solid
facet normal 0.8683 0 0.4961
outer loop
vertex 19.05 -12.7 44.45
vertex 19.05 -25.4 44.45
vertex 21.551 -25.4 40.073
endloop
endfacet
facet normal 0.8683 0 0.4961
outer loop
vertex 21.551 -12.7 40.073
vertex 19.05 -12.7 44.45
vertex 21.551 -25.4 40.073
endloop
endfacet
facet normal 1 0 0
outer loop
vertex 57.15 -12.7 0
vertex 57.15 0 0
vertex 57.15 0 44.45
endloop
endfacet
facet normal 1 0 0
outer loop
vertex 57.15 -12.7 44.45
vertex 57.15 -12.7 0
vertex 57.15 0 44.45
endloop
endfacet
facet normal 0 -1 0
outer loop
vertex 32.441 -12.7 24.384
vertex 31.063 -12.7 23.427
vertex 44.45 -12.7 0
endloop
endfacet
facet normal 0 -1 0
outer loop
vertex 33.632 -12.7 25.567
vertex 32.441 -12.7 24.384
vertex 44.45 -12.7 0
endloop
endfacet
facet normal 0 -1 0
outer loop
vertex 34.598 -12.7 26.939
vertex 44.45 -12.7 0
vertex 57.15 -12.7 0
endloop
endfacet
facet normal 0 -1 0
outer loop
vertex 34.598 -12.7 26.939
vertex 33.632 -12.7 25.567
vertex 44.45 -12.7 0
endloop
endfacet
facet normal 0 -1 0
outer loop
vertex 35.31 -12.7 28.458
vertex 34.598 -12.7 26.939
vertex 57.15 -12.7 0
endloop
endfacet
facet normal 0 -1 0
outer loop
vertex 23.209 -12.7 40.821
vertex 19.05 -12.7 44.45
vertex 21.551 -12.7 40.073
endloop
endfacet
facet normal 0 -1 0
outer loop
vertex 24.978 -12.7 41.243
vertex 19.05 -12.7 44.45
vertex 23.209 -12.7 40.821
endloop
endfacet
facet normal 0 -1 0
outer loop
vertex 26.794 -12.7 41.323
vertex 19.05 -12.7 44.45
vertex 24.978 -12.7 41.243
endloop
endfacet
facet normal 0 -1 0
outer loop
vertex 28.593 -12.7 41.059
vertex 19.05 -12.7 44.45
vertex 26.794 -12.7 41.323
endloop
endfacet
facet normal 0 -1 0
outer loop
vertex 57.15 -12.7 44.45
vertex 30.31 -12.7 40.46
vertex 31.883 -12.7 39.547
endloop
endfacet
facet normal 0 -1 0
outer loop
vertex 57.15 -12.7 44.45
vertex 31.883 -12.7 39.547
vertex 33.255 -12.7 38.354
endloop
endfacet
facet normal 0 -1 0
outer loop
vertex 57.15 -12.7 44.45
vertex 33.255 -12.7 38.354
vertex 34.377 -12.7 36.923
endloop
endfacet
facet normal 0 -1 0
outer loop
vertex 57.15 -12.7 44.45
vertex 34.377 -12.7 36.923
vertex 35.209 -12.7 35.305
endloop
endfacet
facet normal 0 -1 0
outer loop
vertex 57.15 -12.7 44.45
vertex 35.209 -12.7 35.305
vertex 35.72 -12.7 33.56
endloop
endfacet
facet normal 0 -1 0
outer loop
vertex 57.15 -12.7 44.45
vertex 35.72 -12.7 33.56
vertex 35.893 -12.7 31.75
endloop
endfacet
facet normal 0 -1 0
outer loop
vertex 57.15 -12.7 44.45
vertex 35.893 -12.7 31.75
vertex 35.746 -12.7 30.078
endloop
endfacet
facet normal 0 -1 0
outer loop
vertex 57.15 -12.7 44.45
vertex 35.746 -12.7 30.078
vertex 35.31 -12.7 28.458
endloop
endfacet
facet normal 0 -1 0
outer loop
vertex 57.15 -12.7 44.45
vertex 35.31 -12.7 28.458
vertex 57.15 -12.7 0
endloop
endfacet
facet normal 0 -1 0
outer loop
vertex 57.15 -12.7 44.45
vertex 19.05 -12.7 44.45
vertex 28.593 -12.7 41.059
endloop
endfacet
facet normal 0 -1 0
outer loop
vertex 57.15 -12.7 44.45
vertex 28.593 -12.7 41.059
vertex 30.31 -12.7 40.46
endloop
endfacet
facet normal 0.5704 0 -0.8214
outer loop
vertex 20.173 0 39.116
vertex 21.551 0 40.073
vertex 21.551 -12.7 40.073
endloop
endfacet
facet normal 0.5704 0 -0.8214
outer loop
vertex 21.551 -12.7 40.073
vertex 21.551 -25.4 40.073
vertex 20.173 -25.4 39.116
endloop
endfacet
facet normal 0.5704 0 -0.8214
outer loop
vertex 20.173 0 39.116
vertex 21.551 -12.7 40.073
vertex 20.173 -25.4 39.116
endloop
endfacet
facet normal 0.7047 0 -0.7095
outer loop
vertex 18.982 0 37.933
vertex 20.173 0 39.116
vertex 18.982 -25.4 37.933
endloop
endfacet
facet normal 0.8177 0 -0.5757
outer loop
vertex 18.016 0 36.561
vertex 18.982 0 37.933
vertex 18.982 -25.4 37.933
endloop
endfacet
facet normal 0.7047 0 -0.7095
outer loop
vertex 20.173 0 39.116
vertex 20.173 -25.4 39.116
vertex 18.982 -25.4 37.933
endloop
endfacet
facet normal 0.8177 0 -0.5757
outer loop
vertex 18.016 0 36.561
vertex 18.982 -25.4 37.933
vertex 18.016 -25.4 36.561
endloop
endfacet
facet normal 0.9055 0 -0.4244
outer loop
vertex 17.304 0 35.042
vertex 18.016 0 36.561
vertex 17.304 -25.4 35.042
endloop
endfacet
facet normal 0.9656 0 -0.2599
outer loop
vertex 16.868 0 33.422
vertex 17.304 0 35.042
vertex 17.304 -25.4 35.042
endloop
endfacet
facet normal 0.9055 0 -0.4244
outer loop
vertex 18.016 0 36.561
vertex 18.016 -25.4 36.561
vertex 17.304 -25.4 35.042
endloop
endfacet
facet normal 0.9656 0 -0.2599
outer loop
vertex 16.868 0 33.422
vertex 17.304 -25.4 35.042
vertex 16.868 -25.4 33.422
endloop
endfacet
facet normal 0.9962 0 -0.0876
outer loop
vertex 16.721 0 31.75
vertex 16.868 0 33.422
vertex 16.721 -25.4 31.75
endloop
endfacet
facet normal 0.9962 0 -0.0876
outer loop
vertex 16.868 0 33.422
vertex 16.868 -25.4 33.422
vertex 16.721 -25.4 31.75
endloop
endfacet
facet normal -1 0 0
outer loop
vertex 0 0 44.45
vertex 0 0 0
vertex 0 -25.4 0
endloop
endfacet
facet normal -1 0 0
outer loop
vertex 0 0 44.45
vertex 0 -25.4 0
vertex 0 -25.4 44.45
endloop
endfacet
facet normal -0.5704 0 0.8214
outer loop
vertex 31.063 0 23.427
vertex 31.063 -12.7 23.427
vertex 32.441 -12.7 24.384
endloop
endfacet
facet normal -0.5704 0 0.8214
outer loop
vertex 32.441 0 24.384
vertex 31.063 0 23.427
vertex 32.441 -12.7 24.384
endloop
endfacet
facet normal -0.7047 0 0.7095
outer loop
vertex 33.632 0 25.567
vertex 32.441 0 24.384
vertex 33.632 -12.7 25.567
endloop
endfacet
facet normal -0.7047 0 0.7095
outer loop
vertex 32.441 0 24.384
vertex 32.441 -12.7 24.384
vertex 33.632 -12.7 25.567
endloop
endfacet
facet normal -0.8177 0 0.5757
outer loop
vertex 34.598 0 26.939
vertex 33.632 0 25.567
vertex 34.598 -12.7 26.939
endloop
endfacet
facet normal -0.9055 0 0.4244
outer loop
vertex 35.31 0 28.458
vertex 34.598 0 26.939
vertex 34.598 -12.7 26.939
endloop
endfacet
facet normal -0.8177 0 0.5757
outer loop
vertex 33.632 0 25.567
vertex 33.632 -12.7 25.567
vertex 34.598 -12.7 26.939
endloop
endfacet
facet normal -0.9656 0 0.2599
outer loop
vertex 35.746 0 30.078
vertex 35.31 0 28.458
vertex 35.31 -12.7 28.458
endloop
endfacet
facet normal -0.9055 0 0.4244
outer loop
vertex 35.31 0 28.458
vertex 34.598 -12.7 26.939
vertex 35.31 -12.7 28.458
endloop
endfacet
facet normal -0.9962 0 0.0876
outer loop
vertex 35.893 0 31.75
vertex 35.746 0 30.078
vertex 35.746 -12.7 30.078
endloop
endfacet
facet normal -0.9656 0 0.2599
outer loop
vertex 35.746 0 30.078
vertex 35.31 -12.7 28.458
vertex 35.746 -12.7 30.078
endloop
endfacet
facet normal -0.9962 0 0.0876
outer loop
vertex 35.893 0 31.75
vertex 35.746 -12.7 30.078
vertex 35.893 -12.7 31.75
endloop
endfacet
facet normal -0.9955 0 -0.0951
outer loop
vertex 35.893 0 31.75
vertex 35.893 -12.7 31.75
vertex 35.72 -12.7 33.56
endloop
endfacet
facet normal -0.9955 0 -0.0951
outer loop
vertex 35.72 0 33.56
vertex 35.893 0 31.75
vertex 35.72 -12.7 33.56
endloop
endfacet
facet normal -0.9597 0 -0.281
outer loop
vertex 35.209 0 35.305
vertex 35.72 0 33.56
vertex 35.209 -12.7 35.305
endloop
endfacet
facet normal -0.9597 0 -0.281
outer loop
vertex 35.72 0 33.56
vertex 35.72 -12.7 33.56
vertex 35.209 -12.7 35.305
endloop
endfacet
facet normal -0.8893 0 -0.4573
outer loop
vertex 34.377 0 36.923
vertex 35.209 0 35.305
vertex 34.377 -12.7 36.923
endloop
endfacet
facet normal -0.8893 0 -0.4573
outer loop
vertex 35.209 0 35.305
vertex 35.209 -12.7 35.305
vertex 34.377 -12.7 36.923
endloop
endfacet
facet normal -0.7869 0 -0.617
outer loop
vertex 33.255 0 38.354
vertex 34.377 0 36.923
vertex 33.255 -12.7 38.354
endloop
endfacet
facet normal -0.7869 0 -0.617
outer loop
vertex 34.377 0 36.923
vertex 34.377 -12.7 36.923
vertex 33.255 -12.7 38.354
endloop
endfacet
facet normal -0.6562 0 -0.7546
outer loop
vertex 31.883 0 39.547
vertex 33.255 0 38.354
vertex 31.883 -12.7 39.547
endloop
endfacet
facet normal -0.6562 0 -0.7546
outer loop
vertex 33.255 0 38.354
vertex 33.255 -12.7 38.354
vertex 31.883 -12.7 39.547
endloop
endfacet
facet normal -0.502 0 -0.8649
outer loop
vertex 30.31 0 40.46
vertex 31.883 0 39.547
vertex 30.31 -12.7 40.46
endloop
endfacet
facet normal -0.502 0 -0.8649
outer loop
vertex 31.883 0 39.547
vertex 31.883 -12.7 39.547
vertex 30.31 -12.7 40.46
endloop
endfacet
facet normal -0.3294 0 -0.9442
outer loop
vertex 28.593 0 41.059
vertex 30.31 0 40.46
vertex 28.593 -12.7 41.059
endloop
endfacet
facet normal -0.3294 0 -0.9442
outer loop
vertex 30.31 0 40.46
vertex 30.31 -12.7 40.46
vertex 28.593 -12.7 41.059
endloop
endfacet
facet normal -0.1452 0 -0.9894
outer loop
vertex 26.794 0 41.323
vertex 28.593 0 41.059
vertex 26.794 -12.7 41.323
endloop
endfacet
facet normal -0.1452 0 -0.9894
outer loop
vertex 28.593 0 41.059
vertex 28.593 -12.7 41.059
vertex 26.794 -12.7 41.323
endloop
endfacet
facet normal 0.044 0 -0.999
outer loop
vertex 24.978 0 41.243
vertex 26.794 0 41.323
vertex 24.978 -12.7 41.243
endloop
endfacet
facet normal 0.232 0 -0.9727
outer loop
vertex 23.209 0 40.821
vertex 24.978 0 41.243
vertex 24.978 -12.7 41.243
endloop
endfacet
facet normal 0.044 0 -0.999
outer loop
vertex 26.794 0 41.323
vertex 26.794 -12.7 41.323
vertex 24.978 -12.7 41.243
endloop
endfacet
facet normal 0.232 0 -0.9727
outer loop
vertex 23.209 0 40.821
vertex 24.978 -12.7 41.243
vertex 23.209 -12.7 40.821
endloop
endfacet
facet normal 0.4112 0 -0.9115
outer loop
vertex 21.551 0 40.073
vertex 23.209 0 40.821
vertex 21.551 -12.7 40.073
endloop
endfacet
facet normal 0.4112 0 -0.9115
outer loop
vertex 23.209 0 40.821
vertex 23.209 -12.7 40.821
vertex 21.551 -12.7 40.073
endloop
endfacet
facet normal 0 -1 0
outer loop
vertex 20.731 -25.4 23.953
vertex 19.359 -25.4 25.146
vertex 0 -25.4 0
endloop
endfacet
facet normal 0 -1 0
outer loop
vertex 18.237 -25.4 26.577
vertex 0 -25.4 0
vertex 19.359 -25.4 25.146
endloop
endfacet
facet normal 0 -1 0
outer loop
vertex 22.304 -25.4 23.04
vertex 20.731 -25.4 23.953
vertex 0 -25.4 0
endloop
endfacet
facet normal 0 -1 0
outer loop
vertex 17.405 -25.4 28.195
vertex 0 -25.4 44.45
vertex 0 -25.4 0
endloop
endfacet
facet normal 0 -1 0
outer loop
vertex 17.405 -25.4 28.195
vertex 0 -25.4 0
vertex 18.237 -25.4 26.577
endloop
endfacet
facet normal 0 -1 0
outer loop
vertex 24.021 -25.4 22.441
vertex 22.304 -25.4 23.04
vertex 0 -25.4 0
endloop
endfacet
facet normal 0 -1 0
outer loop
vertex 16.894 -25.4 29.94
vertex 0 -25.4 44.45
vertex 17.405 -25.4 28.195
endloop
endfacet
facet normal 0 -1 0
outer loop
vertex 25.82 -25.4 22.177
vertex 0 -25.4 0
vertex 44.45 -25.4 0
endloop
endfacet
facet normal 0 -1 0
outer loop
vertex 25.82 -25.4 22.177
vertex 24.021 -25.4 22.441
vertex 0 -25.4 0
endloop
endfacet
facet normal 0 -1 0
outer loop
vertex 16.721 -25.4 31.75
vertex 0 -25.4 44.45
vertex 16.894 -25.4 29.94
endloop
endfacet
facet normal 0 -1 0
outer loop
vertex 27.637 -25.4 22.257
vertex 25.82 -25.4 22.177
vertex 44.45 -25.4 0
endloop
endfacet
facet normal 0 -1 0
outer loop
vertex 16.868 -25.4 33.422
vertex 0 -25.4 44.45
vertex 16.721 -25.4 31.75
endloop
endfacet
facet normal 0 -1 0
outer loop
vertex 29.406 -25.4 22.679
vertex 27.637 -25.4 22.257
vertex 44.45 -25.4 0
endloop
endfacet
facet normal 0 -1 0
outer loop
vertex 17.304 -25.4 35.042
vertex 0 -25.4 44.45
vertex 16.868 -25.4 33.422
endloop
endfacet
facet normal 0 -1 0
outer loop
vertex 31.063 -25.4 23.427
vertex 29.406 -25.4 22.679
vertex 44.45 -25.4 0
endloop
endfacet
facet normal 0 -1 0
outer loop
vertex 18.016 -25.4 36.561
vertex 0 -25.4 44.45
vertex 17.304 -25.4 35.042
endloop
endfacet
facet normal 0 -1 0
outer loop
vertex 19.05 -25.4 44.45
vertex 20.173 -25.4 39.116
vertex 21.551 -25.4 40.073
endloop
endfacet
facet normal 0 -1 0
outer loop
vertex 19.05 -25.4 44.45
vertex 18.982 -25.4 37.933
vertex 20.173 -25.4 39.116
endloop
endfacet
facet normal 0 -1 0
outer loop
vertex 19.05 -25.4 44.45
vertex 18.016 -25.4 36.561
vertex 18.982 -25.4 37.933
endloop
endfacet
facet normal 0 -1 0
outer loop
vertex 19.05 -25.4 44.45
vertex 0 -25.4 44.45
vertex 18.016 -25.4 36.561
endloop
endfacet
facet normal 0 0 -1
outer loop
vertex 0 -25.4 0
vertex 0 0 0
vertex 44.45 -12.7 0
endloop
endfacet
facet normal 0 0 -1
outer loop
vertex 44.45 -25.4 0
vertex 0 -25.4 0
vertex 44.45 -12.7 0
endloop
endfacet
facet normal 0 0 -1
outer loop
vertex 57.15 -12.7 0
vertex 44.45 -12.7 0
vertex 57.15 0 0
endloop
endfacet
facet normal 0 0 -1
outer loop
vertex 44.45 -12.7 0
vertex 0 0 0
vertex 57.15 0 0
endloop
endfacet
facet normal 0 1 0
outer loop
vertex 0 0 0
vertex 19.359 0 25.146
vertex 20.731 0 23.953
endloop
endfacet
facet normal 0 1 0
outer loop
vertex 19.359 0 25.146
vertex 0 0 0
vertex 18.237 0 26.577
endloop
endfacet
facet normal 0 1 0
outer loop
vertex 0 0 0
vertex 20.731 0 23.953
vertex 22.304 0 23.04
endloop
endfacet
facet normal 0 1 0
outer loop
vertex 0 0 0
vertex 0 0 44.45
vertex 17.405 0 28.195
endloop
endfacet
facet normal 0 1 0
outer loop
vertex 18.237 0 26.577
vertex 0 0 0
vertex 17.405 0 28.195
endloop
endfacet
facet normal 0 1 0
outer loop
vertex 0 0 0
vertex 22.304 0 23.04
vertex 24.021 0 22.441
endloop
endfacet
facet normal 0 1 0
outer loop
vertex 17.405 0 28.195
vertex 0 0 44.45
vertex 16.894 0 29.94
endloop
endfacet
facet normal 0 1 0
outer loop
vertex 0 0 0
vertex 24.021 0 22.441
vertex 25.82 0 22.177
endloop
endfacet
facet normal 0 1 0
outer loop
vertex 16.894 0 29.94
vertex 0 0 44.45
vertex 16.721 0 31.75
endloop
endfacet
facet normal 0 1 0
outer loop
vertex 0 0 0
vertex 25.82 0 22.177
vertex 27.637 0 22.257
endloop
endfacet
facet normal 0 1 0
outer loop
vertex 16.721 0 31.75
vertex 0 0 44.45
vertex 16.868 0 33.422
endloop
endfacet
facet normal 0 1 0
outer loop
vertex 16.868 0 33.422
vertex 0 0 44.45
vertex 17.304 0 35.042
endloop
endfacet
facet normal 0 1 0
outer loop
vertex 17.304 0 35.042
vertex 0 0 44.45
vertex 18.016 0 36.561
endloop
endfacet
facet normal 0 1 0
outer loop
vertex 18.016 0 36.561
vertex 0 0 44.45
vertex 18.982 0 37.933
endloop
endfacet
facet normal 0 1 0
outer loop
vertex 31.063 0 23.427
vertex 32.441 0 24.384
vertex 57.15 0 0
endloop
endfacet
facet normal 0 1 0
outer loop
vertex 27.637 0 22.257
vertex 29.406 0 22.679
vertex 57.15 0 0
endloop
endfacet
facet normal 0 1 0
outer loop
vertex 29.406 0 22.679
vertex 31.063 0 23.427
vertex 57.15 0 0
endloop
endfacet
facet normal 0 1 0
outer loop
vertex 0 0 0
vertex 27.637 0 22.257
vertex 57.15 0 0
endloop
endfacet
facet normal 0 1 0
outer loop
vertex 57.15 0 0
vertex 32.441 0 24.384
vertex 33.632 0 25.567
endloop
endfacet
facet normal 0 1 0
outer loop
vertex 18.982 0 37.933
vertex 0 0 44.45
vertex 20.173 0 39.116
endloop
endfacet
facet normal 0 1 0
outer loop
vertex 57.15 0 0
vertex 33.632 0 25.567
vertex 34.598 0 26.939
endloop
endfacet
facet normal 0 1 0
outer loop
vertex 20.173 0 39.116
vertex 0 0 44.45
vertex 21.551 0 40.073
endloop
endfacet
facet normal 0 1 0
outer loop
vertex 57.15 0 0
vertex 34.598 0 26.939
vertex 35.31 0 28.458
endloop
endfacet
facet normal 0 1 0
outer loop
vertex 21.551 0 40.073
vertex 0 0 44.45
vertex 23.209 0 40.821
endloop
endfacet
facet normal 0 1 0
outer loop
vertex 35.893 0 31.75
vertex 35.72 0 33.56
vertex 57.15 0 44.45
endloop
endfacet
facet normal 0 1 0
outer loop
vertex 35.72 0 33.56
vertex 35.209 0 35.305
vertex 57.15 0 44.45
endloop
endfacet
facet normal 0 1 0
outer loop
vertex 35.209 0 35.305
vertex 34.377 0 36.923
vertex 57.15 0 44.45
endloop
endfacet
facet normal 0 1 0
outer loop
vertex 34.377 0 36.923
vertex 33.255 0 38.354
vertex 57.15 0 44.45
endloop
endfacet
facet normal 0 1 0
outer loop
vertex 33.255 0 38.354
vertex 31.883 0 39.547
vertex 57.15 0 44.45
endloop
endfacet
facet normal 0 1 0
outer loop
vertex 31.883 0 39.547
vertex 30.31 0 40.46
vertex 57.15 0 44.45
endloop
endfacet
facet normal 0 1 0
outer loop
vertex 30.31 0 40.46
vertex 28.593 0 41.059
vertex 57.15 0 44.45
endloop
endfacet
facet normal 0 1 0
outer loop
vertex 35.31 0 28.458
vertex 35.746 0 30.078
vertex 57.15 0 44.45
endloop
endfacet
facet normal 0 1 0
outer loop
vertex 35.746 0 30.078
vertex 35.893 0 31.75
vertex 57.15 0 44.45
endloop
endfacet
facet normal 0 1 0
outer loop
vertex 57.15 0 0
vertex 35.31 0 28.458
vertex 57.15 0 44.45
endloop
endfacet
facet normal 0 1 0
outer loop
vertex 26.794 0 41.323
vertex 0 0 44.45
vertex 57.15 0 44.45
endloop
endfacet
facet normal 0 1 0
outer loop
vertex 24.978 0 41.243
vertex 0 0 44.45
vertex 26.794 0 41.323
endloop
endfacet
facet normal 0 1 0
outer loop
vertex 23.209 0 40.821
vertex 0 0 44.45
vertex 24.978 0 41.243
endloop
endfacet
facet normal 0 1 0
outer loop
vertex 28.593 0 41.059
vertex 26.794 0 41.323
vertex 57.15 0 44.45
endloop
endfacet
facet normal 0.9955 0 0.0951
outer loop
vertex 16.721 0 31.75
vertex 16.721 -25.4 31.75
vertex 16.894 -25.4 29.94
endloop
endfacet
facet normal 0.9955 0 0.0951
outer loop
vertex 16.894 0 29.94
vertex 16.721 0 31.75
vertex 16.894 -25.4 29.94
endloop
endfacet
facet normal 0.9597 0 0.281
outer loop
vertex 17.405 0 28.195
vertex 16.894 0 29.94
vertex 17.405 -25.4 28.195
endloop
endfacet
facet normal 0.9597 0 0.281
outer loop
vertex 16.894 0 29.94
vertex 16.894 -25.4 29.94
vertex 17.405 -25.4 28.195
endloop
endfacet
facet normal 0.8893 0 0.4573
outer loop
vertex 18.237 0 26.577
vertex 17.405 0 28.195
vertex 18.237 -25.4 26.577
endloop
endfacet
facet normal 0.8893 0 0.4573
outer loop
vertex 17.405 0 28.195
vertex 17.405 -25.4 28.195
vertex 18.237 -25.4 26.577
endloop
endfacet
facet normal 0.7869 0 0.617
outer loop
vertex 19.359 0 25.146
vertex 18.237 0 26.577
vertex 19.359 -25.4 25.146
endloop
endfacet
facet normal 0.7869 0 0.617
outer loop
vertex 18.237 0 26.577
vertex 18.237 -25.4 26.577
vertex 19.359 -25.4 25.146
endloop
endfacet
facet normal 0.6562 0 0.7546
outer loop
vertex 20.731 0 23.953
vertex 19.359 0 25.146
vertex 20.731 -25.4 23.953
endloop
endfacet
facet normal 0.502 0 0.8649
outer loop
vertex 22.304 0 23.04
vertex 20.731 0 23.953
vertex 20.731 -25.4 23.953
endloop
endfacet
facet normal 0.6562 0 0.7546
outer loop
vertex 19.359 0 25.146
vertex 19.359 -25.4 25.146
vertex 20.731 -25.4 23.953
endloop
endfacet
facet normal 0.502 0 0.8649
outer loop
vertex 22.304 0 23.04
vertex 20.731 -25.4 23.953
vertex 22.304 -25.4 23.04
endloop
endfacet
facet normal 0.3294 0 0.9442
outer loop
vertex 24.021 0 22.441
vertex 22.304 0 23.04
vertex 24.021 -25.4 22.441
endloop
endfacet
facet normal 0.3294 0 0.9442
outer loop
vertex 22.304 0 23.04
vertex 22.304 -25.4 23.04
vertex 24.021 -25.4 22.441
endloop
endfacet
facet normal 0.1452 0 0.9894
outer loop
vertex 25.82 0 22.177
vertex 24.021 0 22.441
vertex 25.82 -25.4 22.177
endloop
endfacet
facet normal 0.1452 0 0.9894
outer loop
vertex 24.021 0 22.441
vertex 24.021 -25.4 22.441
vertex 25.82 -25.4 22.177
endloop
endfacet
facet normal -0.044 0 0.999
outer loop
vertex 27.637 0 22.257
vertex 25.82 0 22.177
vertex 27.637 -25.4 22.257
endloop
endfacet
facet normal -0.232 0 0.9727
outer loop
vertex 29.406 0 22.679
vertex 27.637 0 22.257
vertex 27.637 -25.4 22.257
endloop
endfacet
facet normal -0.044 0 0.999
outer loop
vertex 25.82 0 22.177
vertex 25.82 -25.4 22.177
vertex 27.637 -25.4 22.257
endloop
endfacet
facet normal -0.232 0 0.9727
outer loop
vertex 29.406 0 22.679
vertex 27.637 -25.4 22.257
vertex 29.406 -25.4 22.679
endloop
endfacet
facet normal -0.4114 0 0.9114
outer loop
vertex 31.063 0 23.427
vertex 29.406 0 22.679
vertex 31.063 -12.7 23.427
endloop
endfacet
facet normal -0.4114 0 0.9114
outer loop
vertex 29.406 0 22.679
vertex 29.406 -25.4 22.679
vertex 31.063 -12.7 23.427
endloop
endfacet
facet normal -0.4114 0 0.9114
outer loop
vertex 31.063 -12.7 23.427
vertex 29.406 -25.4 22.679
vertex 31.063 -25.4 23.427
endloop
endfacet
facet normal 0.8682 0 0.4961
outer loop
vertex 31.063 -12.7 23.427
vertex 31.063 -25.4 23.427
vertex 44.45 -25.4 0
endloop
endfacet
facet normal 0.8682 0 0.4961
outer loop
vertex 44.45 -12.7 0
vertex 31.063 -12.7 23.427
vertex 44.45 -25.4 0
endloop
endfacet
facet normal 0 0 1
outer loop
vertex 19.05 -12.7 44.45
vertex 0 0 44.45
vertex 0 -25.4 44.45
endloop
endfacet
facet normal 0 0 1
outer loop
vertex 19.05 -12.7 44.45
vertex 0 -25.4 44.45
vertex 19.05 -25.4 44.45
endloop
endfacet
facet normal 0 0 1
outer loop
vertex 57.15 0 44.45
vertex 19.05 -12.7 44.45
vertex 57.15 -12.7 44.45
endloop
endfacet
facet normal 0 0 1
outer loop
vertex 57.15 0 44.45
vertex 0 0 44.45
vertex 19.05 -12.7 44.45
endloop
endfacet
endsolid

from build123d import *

# Parameters (mm, degrees)
F0_W     = 57.15
F0_H     = 44.45
F1_DEPTH = 25.4
F3_DEPTH = 25.401
F5_DEPTH = 12.7


with BuildPart() as f1:
    # F0 (on Front) → F1 (new body)
    with BuildSketch(Plane.XZ):
        with Locations((28.575, 22.225)):
            Rectangle(F0_W, F0_H)
    extrude(amount=F1_DEPTH)

    # F2 (on face) → F3 (cut, through all)
    with BuildSketch(Plane.XZ.offset(25.4)):
        with BuildLine():
            ThreePointArc((35.892886882, 31.75), (31.1184848556, 40.0408067571), (21.5512819933, 40.0727565117))
            Line((21.5512819933, 40.0727565117), (26.3071428571, 31.75))
            Line((26.3071428571, 31.75), (35.892886882, 31.75))
        make_face()
        with BuildLine():
            Line((26.3071428571, 31.75), (21.5512819933, 40.0727565117))
            ThreePointArc((21.5512819933, 40.0727565117), (18.0163361, 36.5613419984), (16.7213988323, 31.75))
            Line((16.7213988323, 31.75), (26.3071428571, 31.75))
        make_face()
        with BuildLine():
            Line((31.063003721, 23.4272434883), (26.3071428571, 31.75))
            Line((26.3071428571, 31.75), (16.7213988323, 31.75))
            ThreePointArc((16.7213988323, 31.75), (21.4958008587, 23.4591932429), (31.063003721, 23.4272434883))
        make_face()
        with BuildLine():
            Line((35.892886882, 31.75), (26.3071428571, 31.75))
            Line((26.3071428571, 31.75), (31.063003721, 23.4272434883))
            ThreePointArc((31.063003721, 23.4272434883), (34.5979496143, 26.9386580016), (35.892886882, 31.75))
        make_face()
    extrude(amount=-F3_DEPTH, mode=Mode.SUBTRACT)

    # F4 (on face) → F5 (cut)
    with BuildSketch(Plane.XZ.offset(25.4)):
        with BuildLine():
            Line((57.15, 44.45), (19.05, 44.45))
            Line((19.05, 44.45), (21.5512819933, 40.0727565117))
            ThreePointArc((21.5512819933, 40.0727565117), (31.1184848556, 40.0408067571), (35.892886882, 31.75))
            ThreePointArc((35.892886882, 31.75), (34.5979496143, 26.9386580016), (31.063003721, 23.4272434883))
            Line((31.063003721, 23.4272434883), (44.45, 0))
            Line((44.45, 0), (57.15, 0))
            Line((57.15, 0), (57.15, 44.45))
        make_face()
    extrude(amount=-F5_DEPTH, mode=Mode.SUBTRACT)


solid = f1.part
